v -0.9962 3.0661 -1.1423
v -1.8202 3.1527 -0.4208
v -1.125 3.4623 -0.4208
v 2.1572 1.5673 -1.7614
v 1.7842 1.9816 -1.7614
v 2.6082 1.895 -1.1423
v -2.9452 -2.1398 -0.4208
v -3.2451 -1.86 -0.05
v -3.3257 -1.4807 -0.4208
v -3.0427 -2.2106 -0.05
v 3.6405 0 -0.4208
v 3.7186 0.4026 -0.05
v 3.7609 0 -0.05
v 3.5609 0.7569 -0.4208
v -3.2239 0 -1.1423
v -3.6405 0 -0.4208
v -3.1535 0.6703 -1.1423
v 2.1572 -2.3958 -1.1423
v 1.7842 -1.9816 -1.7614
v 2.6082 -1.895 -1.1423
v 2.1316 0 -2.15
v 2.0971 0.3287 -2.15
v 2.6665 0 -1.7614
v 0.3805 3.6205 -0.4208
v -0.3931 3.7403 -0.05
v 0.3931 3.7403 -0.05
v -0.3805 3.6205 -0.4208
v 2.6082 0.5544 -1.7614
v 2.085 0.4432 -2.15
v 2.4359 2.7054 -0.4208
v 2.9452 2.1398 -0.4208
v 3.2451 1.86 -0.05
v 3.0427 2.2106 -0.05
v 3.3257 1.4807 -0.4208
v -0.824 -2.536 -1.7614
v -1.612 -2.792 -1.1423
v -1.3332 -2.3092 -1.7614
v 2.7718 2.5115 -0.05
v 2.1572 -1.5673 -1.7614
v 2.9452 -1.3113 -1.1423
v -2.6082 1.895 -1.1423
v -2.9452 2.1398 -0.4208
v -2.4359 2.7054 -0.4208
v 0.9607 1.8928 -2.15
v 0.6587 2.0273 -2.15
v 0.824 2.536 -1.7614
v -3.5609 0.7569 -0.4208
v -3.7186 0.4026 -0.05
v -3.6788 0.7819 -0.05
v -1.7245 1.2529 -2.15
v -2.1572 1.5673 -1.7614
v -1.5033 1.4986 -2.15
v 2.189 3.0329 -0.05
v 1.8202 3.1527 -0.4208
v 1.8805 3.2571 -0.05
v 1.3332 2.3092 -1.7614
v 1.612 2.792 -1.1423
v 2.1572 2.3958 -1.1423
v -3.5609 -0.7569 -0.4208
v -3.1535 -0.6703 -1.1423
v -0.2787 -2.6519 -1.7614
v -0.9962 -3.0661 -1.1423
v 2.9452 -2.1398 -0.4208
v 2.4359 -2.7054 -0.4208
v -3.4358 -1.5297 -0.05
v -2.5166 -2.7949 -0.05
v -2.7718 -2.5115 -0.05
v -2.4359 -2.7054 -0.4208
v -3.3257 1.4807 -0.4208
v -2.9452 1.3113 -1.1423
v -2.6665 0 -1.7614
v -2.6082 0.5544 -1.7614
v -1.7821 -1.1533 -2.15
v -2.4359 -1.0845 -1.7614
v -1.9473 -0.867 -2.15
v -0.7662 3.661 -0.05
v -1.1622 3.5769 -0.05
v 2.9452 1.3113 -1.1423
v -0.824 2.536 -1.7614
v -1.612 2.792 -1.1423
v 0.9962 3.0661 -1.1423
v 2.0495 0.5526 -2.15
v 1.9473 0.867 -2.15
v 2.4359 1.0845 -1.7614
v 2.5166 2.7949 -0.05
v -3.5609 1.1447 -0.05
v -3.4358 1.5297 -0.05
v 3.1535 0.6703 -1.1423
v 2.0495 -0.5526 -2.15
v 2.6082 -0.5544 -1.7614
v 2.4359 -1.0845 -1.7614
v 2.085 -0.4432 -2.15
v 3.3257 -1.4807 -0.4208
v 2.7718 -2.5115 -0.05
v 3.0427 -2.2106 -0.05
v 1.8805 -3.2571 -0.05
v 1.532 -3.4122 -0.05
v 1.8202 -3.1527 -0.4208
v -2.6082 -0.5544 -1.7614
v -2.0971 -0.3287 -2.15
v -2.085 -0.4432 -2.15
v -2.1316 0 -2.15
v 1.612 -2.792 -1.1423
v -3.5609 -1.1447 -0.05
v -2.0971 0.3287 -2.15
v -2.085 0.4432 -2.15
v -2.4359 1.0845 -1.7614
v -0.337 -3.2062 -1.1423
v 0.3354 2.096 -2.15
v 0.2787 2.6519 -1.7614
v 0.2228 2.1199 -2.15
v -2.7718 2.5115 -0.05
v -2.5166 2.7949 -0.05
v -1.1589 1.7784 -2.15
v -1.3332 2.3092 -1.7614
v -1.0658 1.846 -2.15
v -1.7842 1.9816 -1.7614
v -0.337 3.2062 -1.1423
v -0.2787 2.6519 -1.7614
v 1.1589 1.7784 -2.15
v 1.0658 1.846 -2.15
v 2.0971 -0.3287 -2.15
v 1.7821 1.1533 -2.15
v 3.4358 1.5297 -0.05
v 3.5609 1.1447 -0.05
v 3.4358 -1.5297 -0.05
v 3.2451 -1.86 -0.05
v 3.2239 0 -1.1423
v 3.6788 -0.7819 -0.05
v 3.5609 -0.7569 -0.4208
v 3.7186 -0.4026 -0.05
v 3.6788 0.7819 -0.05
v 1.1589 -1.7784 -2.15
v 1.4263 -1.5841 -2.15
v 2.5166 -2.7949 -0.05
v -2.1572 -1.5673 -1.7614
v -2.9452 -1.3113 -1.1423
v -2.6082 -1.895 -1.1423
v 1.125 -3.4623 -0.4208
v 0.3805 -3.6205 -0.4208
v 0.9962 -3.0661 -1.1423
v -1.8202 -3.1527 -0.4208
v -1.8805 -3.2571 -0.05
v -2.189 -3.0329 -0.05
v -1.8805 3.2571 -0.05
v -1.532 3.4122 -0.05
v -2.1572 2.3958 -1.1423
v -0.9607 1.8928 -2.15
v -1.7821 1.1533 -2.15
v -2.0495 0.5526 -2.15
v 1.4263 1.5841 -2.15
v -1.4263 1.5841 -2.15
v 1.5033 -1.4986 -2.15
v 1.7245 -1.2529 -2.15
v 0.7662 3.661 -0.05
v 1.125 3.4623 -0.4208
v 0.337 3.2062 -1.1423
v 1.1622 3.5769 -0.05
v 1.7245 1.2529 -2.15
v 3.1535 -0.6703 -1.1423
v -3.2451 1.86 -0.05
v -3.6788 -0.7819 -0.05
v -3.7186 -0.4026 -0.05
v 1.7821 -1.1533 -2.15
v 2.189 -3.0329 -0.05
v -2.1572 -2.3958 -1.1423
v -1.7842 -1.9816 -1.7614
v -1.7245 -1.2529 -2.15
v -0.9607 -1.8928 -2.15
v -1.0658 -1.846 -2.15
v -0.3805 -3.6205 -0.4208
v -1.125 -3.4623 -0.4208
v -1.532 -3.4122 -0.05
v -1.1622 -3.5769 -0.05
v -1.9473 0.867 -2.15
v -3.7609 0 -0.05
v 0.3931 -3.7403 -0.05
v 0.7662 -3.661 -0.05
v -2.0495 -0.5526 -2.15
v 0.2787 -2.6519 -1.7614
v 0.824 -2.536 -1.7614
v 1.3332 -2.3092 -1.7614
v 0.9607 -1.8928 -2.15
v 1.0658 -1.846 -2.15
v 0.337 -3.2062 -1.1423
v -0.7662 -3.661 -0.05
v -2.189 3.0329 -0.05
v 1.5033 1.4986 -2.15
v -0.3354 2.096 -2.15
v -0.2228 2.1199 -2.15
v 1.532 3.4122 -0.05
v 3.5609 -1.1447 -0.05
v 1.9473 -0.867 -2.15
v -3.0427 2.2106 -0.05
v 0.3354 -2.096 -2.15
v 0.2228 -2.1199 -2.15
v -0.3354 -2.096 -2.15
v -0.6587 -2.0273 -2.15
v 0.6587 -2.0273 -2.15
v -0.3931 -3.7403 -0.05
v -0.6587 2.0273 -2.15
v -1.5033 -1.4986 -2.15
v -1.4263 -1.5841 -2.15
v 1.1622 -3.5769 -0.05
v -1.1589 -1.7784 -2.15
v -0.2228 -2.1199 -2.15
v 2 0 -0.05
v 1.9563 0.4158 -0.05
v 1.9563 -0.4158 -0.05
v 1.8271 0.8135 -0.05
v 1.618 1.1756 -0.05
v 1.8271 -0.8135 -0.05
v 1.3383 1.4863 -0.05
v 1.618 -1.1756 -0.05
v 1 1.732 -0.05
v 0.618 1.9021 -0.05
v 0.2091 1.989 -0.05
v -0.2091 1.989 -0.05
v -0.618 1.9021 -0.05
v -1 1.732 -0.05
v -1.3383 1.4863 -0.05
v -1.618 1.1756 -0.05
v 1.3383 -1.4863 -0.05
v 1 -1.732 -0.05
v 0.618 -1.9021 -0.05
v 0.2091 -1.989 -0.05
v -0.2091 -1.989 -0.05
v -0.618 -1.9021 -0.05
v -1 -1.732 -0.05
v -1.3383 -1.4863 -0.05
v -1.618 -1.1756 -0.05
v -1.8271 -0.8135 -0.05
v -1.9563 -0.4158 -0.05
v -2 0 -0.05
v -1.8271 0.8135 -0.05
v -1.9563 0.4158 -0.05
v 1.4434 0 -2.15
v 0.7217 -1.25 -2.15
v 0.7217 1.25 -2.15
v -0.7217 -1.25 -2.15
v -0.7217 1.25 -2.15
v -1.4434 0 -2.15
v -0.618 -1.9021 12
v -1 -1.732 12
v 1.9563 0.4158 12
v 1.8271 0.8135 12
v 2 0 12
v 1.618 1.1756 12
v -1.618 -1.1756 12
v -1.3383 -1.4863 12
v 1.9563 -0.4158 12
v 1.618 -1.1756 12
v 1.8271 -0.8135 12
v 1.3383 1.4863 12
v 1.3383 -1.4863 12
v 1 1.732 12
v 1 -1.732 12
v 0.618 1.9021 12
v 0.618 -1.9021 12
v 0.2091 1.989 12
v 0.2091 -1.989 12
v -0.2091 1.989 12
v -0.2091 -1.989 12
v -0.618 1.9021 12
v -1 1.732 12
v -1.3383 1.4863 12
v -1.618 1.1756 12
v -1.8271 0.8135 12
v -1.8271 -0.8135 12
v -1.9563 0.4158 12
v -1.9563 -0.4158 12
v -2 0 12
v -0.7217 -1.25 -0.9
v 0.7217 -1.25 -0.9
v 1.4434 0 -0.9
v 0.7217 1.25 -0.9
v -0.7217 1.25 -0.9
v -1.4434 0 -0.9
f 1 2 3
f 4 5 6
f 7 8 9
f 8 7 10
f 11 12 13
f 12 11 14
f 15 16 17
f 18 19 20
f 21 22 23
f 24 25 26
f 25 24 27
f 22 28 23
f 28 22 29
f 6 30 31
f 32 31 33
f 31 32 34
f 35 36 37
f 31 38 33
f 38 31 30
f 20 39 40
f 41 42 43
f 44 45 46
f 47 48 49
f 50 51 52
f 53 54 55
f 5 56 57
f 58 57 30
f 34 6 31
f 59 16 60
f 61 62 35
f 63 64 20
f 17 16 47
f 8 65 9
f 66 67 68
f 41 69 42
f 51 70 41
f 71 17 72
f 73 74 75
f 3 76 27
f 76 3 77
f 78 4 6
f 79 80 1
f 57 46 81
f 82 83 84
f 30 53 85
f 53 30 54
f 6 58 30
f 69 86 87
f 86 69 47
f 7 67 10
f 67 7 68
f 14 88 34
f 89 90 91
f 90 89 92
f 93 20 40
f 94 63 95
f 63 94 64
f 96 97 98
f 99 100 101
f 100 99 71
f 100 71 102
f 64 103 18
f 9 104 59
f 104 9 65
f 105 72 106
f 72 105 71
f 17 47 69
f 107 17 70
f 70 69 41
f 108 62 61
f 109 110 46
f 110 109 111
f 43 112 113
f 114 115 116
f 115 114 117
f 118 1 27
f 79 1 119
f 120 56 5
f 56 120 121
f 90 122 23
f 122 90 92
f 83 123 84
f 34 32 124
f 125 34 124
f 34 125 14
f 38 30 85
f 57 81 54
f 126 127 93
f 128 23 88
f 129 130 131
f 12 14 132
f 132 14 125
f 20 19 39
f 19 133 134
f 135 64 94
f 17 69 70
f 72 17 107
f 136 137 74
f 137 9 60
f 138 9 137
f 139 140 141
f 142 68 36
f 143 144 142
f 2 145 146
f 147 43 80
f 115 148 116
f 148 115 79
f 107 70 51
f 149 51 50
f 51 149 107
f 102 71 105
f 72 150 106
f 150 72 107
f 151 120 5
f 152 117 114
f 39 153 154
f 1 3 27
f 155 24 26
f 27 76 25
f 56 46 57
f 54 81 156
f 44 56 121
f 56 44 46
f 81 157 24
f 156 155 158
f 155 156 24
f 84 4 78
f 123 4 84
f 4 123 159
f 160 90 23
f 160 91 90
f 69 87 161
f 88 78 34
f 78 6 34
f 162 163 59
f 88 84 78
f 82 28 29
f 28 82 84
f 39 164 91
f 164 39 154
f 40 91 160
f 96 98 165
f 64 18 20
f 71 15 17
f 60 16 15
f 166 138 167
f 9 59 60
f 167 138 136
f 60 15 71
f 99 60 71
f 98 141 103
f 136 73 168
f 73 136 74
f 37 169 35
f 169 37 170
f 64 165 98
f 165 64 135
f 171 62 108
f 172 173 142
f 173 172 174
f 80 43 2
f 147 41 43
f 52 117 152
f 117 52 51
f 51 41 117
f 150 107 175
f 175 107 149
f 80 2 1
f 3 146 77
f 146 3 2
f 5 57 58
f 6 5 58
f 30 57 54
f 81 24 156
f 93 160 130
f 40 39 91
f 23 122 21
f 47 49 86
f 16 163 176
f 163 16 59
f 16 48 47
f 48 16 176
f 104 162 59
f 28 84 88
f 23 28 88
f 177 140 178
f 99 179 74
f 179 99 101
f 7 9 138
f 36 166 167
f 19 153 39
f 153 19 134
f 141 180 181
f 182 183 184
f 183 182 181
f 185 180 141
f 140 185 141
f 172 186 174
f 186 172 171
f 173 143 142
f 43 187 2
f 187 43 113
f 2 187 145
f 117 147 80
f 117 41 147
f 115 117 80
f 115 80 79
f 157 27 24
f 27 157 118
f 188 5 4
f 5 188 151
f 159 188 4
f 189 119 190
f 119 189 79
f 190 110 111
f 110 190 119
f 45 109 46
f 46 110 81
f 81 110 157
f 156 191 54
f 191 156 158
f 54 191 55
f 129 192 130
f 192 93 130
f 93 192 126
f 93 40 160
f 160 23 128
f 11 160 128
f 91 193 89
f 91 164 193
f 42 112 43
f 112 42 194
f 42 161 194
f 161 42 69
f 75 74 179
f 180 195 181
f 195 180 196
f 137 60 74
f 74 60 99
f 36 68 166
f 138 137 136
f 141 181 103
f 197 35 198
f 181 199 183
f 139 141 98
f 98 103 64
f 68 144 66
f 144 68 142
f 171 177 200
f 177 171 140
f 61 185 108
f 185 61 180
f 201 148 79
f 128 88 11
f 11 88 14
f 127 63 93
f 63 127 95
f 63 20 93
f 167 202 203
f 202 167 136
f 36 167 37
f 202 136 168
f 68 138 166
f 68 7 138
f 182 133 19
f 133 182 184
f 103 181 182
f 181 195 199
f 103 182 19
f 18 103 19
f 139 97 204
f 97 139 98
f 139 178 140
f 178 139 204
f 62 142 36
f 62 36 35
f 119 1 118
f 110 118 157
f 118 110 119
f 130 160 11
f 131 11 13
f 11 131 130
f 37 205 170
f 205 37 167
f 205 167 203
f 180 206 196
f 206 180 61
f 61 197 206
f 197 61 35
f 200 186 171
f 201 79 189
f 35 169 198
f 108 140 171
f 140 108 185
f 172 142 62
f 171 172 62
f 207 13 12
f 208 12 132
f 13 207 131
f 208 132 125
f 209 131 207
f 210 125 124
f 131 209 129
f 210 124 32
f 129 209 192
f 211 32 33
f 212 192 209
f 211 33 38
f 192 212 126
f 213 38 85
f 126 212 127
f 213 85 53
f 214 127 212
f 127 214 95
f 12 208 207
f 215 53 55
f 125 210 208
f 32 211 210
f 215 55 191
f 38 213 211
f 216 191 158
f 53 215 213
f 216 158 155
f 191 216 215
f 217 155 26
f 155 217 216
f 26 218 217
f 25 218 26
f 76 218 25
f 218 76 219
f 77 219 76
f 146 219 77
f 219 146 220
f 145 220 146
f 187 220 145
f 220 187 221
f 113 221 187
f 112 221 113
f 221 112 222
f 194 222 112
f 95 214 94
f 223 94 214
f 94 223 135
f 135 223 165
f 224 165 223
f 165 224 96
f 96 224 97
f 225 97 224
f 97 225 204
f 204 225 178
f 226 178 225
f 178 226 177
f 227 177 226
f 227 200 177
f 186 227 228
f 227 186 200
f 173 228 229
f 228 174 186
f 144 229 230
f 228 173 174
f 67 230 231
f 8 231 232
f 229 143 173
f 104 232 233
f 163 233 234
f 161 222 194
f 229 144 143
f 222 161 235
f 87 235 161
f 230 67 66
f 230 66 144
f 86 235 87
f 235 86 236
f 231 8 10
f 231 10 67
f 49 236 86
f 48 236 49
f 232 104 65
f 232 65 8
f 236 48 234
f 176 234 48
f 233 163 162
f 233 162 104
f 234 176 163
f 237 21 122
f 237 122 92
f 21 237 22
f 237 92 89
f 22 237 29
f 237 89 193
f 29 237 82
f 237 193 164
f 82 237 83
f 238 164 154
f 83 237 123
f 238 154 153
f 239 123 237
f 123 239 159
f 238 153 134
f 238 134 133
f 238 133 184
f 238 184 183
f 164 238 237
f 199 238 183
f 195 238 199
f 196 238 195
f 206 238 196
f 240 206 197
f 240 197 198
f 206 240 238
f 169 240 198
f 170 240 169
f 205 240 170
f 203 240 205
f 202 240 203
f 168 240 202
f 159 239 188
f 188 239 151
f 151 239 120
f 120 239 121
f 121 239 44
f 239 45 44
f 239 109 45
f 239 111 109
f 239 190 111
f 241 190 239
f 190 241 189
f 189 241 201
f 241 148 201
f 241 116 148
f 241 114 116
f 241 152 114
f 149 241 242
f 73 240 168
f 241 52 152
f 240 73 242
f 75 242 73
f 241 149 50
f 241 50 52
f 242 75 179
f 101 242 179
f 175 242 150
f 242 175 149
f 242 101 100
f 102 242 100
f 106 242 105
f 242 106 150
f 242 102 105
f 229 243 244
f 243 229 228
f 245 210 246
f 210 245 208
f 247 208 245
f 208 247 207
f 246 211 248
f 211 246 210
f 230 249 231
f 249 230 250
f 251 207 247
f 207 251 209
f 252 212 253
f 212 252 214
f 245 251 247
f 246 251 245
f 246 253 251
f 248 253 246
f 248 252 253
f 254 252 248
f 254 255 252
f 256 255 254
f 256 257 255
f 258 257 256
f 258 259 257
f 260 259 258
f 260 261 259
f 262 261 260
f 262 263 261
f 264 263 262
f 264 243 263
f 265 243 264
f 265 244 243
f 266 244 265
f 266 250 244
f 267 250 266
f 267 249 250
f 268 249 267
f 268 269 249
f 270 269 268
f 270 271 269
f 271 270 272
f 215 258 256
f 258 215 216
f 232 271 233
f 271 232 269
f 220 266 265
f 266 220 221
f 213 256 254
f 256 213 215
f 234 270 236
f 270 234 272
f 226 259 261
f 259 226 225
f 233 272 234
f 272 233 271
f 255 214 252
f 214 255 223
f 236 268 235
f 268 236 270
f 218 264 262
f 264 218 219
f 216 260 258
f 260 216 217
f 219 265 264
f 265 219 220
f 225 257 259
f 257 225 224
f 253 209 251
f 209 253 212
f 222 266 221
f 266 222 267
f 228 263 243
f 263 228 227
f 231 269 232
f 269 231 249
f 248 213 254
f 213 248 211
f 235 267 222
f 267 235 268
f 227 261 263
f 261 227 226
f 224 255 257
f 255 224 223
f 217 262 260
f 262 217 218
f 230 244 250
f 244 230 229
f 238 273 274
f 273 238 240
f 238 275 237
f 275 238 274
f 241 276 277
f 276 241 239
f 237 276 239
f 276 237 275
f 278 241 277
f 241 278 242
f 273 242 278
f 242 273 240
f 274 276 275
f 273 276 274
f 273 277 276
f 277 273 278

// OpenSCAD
/*
   Copyright 2018 Scott Bezek and the splitflap contributors

   Licensed under the Apache License, Version 2.0 (the "License");
   you may not use this file except in compliance with the License.
   You may obtain a copy of the License at

       http://www.apache.org/licenses/LICENSE-2.0

   Unless required by applicable law or agreed to in writing, software
   distributed under the License is distributed on an "AS IS" BASIS,
   WITHOUT WARRANTIES OR CONDITIONS OF ANY KIND, either express or implied.
   See the License for the specific language governing permissions and
   limitations under the License.
*/

module roughM4_7380(length) {
    eps = 0.1;
    thread_diameter = 4;
    head_diameter = 7.6;
    head_length = 2.2;
    driving_depth = 1.3;
    driving_apothem = 2.5/2;
    driving_radius = driving_apothem / cos(180/6);

    sphere_offset = 1.2;  // Just a guess
    sphere_radius = sqrt(sphere_offset*sphere_offset + (head_diameter/2)*(head_diameter/2));


    difference() {
        union() {
            translate([0, 0, -eps]) {
                cylinder(h=length+eps, d=thread_diameter, $fn=30);
            }
            difference() {
                translate([0, 0, sphere_offset]) {
                    sphere(sphere_radius, $fn=30);
                }
                translate([0, 0, sphere_radius]) {
                    cube([sphere_radius*2 + eps, sphere_radius*2 + eps, sphere_radius*2 + eps], center=true);
                }
                translate([0, 0, -sphere_radius - head_length]) {
                    cube([sphere_radius*2 + eps, sphere_radius*2 + eps, sphere_radius*2 + eps], center=true);
                }
            }
        }
        translate([0, 0, -head_length-eps]) {
            cylinder(h=driving_depth+eps, r=driving_radius, $fn=6);
        }
    }
}

roughM4_7380(12);

module color_extractor(c) {
    echo(extracted_color=c);
    children();
}
